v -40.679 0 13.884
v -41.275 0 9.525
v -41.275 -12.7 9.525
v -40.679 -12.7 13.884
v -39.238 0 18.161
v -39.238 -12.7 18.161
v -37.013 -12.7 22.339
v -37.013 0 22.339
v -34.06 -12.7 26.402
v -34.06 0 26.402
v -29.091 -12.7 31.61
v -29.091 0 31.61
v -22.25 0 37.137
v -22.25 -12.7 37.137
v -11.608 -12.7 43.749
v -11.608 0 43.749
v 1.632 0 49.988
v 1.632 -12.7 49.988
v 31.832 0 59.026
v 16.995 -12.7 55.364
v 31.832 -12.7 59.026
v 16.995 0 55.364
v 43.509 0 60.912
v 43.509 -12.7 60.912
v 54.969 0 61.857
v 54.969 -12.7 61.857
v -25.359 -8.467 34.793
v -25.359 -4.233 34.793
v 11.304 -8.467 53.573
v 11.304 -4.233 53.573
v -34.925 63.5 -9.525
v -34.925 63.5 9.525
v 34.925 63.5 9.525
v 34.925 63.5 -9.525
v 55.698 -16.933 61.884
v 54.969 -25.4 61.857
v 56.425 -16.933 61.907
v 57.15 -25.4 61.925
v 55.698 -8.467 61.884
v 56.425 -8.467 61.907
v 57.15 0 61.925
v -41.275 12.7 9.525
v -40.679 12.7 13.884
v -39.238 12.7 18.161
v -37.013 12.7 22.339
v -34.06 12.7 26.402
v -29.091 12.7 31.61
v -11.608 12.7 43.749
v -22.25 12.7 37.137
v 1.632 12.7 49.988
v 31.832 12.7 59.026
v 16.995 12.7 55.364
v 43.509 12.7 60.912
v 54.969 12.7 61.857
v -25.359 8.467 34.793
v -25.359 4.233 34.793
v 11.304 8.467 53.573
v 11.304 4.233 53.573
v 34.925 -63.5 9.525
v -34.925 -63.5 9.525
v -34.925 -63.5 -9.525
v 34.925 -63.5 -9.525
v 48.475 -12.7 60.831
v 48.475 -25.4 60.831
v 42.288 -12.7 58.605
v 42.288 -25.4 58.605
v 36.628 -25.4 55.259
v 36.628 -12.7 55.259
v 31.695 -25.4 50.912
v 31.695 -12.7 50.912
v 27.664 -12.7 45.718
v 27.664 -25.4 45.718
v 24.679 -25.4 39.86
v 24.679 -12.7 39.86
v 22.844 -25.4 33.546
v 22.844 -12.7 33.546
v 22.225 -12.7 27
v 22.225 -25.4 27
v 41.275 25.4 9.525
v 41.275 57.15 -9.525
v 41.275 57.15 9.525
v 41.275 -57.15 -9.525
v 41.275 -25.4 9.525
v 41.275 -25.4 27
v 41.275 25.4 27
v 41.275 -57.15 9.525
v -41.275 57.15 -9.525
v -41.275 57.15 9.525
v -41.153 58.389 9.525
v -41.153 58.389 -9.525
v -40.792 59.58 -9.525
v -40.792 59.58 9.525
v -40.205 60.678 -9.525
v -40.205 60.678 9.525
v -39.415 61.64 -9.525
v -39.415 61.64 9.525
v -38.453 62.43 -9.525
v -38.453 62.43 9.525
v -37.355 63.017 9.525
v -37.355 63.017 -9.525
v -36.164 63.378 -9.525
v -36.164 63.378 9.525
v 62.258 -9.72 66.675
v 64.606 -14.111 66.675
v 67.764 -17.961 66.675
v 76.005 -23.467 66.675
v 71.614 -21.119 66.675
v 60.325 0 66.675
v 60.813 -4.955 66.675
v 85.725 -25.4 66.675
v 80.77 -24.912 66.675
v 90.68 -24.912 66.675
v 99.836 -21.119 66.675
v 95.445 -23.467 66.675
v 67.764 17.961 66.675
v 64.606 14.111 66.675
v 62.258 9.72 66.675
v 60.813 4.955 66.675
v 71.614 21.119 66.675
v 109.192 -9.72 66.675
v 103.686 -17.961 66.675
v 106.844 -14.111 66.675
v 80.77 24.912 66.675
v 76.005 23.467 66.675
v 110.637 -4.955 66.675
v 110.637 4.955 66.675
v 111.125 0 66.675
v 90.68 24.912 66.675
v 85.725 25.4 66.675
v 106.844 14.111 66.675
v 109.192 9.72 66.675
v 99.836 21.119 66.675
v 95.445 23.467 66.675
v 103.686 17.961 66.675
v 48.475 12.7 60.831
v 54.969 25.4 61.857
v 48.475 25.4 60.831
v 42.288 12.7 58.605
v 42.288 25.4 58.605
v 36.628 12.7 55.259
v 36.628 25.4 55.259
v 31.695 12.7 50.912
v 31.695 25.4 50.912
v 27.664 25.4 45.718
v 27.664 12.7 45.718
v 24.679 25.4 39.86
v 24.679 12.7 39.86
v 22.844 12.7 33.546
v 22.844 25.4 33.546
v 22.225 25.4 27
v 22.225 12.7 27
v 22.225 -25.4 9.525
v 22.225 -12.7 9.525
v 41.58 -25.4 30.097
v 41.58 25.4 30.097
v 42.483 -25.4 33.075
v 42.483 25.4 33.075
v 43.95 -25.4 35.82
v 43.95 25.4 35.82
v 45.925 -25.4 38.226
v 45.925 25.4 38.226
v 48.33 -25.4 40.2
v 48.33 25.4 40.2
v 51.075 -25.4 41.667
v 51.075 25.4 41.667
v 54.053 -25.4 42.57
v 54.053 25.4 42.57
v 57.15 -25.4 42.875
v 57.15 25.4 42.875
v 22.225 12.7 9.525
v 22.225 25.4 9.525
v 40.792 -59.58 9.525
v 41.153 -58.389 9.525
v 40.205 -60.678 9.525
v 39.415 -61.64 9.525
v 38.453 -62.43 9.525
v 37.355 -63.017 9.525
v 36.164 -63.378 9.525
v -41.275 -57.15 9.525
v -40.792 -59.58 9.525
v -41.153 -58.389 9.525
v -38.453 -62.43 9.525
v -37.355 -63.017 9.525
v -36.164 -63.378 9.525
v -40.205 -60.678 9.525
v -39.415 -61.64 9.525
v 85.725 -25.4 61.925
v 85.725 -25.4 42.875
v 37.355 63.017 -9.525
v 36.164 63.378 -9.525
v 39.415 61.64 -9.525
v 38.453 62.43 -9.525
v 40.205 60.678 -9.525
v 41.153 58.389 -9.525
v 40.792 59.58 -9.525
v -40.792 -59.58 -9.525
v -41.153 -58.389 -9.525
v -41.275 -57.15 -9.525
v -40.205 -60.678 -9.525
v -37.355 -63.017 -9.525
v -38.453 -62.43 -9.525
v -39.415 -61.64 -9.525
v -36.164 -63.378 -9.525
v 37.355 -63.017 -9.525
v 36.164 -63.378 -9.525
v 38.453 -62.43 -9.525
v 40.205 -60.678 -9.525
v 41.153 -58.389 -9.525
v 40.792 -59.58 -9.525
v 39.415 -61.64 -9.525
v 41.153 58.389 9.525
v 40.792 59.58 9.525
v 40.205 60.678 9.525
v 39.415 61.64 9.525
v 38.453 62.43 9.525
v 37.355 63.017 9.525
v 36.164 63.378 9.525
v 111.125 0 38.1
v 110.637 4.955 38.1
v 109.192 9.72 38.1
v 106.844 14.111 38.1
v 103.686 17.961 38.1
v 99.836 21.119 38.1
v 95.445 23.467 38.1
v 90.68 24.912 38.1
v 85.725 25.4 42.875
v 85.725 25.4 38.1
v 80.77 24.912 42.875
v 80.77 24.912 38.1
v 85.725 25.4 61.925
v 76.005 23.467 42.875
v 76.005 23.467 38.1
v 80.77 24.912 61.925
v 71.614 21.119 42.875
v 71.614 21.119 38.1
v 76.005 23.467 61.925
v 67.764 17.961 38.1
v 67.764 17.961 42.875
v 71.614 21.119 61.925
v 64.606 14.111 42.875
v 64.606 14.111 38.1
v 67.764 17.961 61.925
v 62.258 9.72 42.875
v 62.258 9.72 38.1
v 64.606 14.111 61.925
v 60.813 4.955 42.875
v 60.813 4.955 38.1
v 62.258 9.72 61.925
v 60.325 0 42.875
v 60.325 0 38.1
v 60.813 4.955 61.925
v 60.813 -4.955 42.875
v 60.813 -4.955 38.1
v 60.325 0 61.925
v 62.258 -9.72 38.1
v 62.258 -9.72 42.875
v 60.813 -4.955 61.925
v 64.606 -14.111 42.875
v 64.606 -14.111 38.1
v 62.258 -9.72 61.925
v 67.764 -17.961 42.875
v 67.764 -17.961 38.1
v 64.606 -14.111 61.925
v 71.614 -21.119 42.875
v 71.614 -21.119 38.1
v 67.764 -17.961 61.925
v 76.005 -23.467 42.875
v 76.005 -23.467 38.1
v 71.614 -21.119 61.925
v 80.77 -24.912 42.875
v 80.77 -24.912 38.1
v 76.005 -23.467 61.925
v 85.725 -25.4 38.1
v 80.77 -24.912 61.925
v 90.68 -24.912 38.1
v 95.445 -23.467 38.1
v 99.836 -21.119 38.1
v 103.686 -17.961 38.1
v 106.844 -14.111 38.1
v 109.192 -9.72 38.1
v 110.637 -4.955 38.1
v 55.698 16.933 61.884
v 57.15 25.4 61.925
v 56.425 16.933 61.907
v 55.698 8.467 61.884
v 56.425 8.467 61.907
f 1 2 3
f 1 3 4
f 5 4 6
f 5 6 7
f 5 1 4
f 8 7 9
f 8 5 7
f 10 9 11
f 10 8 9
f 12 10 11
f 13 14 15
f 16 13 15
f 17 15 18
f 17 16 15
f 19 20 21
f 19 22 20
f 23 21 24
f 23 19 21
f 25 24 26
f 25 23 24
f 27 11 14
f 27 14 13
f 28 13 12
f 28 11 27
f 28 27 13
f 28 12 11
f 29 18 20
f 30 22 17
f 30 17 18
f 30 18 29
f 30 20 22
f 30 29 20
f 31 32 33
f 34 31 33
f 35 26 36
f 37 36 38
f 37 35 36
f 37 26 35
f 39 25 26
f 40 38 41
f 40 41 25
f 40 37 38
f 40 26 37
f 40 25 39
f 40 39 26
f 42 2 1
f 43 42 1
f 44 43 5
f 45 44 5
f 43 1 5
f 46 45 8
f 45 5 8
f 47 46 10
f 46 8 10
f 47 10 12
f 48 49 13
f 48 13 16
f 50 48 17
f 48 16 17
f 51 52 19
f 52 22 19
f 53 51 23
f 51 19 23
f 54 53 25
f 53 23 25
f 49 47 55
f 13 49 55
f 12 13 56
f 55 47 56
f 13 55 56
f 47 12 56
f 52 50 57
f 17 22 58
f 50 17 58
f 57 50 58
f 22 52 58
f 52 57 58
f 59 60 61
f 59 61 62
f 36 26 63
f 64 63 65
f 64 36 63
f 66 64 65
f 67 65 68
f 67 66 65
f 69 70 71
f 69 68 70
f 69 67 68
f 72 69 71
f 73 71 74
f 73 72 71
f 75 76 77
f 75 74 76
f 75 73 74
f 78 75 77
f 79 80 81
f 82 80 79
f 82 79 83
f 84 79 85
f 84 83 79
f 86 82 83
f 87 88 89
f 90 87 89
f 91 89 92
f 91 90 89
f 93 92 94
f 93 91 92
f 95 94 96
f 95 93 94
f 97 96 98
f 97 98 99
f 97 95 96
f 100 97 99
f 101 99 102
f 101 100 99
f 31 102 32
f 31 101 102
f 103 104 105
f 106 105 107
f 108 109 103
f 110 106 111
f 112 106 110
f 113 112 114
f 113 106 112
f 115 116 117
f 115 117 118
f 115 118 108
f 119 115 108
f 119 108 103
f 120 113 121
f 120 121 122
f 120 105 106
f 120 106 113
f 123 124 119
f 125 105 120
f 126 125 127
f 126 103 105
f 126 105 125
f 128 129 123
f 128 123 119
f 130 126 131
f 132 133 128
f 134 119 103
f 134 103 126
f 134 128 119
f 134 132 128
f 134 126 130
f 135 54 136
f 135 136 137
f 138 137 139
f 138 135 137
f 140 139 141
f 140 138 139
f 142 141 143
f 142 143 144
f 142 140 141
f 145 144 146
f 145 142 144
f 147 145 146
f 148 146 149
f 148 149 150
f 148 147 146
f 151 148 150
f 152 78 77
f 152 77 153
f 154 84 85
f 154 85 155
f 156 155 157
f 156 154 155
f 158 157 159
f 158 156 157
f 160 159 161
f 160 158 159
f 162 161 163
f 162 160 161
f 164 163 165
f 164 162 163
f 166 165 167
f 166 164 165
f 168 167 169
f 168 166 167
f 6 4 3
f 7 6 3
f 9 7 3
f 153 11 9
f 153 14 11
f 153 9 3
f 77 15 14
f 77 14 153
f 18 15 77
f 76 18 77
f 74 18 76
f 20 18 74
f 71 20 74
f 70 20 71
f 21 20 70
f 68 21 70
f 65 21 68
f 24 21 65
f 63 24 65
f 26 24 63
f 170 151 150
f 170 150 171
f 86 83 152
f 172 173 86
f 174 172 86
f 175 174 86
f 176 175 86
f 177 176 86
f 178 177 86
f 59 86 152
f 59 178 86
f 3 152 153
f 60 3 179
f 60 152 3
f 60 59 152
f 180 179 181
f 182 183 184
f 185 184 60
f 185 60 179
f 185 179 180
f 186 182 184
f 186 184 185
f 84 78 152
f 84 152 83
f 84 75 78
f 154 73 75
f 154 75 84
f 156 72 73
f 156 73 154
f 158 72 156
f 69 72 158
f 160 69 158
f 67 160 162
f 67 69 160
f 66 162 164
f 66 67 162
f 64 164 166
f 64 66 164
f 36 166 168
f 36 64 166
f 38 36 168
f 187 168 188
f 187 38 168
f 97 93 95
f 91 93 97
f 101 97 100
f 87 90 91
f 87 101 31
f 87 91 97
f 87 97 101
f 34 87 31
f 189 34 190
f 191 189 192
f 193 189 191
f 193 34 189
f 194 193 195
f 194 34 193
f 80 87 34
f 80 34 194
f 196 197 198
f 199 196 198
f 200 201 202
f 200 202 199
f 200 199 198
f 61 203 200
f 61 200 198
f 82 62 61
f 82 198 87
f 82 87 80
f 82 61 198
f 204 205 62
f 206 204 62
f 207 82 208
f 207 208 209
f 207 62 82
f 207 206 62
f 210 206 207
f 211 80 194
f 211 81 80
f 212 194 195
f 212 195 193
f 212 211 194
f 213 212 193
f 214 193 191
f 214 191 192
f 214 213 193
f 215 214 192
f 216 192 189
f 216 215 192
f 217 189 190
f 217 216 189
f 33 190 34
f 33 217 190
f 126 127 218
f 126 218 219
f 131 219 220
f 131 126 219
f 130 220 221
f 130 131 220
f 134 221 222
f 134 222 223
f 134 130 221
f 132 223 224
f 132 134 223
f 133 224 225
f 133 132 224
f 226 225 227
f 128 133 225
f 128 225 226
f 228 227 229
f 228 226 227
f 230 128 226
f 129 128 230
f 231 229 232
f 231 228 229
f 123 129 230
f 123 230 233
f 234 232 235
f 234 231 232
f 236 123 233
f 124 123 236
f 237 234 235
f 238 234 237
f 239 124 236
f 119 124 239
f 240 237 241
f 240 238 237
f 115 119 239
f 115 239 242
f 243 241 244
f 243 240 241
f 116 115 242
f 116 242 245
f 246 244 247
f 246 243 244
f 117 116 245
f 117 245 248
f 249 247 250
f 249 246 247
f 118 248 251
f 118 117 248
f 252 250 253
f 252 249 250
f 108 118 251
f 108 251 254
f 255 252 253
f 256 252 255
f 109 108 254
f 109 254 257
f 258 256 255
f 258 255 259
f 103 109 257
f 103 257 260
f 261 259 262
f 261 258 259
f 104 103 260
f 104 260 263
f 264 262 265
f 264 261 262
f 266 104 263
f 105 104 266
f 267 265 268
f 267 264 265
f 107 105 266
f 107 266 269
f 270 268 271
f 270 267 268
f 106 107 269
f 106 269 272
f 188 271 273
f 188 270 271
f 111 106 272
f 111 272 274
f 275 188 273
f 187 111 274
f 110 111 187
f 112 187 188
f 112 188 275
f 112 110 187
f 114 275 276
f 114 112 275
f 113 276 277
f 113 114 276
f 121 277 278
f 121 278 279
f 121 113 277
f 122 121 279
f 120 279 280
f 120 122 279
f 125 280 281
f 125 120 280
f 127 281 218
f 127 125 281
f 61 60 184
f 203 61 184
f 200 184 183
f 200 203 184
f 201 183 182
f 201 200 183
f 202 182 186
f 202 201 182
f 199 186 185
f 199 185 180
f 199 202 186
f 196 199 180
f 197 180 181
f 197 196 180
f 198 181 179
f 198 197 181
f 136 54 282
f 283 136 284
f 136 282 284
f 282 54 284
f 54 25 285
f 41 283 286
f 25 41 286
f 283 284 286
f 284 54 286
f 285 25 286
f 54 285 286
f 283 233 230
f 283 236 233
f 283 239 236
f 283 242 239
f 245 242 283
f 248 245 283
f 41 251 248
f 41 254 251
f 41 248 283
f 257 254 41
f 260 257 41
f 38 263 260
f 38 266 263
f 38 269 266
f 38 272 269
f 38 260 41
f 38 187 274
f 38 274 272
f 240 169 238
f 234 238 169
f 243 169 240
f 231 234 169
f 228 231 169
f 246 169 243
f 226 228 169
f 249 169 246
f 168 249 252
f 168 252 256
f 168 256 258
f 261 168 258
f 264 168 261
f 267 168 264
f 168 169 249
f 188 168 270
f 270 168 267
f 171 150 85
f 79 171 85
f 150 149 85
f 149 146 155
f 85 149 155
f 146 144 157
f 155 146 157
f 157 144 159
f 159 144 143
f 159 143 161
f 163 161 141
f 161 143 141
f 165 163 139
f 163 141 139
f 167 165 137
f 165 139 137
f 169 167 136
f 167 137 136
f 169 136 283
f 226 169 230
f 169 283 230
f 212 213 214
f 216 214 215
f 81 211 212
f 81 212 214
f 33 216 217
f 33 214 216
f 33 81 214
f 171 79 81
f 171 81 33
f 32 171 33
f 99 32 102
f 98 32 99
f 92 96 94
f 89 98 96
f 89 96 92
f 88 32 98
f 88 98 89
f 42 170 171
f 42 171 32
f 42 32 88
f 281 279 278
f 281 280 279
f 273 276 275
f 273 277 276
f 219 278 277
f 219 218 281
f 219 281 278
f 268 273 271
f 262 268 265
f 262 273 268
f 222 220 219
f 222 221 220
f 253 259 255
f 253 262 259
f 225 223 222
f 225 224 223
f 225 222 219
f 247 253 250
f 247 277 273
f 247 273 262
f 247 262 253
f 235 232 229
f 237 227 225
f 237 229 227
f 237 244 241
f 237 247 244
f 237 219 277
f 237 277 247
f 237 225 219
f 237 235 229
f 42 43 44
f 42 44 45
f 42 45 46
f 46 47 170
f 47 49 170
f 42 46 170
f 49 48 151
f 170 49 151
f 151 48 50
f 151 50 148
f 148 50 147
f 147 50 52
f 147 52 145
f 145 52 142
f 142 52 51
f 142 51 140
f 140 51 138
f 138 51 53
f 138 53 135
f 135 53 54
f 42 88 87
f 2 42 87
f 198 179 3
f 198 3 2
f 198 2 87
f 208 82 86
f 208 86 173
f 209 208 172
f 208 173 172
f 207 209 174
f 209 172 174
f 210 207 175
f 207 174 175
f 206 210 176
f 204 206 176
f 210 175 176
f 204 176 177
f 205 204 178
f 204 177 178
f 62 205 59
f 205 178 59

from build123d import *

# Parameters (mm, degrees)
F1_DEPTH = 63.5
F0_W     = 25.4
F0_H     = 19.05
F2_DEPTH = 25.4
F3_DEPTH = 12.7
F5_R     = 6.35


with BuildPart() as f1:
    # F0 (on Front) → F1 (new body, symmetric)
    with BuildSketch(Plane.XZ):
        Polygon((41.275, -9.525), (41.275, 9.525), (22.225, 9.525), (-41.275, 9.525), (-41.275, -9.525), align=None)
    extrude(amount=F1_DEPTH, both=True)

    # F0 (on Front) → F2 (join, symmetric)
    with BuildSketch(Plane.XZ):
        with BuildLine():
            Line((22.225, 9.525), (41.275, 9.525))
            Line((41.275, 9.525), (41.275, 27.0002))
            ThreePointArc((41.275, 27.0002), (45.92468, 38.22552), (57.15, 42.8752))
            Line((57.15, 42.8752), (60.325, 42.8752))
            Line((60.325, 42.8752), (60.325, 61.9252))
            Line((60.325, 61.9252), (57.15, 61.9252))
            add(Edge.make_bspline(
                [(54.968883, 61.857026), (55.698999, 61.886176), (56.426142, 61.908931), (57.15, 61.9252)],
                knots=[109.624995, 109.624995, 109.624995, 109.624995, 111.504536, 111.504536, 111.504536, 111.504536], degree=3))
            ThreePointArc((54.968883, 61.857026), (31.694832, 50.912332), (22.225, 27.0002))
            Line((22.225, 27.0002), (22.225, 9.525))
        make_face()
        with Locations((73.025, 52.4002)):
            Rectangle(F0_W, F0_H)
    extrude(amount=F2_DEPTH, both=True)

    # F0 (on Front) → F3 (join, symmetric)
    with BuildSketch(Plane.XZ):
        with BuildLine():
            Line((-41.275, 9.525), (22.225, 9.525))
            Line((22.225, 9.525), (22.225, 27.0002))
            ThreePointArc((22.225, 27.0002), (31.694832, 50.912332), (54.968883, 61.857026))
            add(Edge.make_bspline(
                [(-41.275, 9.525), (-40.314914, 36.701423), (12.384545, 60.156845), (54.968883, 61.857026)],
                knots=[0, 0, 0, 0, 109.624995, 109.624995, 109.624995, 109.624995], degree=3))
        make_face()
    extrude(amount=F3_DEPTH, both=True)

    # F0 (on Front) → F4 (revolve)
    with BuildSketch(Plane.XZ):
        Polygon((85.725, 61.9252), (85.725, 42.8752), (85.725, 38.1), (111.125, 38.1), (111.125, 66.675), (85.725, 66.675), align=None)
    revolve(axis=Axis((85.725, 0, 52.3875), (0, 0, 1)))

    # F5
    f5_edges = [f1.edges().sort_by_distance(p)[0] for p in [
        (41.275, -63.5, 0),
        (-41.275, -63.5, 0),
        (-41.275, 63.5, 0),
        (41.275, 63.5, 0),
    ]]
    fillet(f5_edges, radius=F5_R)


solid = f1.part
